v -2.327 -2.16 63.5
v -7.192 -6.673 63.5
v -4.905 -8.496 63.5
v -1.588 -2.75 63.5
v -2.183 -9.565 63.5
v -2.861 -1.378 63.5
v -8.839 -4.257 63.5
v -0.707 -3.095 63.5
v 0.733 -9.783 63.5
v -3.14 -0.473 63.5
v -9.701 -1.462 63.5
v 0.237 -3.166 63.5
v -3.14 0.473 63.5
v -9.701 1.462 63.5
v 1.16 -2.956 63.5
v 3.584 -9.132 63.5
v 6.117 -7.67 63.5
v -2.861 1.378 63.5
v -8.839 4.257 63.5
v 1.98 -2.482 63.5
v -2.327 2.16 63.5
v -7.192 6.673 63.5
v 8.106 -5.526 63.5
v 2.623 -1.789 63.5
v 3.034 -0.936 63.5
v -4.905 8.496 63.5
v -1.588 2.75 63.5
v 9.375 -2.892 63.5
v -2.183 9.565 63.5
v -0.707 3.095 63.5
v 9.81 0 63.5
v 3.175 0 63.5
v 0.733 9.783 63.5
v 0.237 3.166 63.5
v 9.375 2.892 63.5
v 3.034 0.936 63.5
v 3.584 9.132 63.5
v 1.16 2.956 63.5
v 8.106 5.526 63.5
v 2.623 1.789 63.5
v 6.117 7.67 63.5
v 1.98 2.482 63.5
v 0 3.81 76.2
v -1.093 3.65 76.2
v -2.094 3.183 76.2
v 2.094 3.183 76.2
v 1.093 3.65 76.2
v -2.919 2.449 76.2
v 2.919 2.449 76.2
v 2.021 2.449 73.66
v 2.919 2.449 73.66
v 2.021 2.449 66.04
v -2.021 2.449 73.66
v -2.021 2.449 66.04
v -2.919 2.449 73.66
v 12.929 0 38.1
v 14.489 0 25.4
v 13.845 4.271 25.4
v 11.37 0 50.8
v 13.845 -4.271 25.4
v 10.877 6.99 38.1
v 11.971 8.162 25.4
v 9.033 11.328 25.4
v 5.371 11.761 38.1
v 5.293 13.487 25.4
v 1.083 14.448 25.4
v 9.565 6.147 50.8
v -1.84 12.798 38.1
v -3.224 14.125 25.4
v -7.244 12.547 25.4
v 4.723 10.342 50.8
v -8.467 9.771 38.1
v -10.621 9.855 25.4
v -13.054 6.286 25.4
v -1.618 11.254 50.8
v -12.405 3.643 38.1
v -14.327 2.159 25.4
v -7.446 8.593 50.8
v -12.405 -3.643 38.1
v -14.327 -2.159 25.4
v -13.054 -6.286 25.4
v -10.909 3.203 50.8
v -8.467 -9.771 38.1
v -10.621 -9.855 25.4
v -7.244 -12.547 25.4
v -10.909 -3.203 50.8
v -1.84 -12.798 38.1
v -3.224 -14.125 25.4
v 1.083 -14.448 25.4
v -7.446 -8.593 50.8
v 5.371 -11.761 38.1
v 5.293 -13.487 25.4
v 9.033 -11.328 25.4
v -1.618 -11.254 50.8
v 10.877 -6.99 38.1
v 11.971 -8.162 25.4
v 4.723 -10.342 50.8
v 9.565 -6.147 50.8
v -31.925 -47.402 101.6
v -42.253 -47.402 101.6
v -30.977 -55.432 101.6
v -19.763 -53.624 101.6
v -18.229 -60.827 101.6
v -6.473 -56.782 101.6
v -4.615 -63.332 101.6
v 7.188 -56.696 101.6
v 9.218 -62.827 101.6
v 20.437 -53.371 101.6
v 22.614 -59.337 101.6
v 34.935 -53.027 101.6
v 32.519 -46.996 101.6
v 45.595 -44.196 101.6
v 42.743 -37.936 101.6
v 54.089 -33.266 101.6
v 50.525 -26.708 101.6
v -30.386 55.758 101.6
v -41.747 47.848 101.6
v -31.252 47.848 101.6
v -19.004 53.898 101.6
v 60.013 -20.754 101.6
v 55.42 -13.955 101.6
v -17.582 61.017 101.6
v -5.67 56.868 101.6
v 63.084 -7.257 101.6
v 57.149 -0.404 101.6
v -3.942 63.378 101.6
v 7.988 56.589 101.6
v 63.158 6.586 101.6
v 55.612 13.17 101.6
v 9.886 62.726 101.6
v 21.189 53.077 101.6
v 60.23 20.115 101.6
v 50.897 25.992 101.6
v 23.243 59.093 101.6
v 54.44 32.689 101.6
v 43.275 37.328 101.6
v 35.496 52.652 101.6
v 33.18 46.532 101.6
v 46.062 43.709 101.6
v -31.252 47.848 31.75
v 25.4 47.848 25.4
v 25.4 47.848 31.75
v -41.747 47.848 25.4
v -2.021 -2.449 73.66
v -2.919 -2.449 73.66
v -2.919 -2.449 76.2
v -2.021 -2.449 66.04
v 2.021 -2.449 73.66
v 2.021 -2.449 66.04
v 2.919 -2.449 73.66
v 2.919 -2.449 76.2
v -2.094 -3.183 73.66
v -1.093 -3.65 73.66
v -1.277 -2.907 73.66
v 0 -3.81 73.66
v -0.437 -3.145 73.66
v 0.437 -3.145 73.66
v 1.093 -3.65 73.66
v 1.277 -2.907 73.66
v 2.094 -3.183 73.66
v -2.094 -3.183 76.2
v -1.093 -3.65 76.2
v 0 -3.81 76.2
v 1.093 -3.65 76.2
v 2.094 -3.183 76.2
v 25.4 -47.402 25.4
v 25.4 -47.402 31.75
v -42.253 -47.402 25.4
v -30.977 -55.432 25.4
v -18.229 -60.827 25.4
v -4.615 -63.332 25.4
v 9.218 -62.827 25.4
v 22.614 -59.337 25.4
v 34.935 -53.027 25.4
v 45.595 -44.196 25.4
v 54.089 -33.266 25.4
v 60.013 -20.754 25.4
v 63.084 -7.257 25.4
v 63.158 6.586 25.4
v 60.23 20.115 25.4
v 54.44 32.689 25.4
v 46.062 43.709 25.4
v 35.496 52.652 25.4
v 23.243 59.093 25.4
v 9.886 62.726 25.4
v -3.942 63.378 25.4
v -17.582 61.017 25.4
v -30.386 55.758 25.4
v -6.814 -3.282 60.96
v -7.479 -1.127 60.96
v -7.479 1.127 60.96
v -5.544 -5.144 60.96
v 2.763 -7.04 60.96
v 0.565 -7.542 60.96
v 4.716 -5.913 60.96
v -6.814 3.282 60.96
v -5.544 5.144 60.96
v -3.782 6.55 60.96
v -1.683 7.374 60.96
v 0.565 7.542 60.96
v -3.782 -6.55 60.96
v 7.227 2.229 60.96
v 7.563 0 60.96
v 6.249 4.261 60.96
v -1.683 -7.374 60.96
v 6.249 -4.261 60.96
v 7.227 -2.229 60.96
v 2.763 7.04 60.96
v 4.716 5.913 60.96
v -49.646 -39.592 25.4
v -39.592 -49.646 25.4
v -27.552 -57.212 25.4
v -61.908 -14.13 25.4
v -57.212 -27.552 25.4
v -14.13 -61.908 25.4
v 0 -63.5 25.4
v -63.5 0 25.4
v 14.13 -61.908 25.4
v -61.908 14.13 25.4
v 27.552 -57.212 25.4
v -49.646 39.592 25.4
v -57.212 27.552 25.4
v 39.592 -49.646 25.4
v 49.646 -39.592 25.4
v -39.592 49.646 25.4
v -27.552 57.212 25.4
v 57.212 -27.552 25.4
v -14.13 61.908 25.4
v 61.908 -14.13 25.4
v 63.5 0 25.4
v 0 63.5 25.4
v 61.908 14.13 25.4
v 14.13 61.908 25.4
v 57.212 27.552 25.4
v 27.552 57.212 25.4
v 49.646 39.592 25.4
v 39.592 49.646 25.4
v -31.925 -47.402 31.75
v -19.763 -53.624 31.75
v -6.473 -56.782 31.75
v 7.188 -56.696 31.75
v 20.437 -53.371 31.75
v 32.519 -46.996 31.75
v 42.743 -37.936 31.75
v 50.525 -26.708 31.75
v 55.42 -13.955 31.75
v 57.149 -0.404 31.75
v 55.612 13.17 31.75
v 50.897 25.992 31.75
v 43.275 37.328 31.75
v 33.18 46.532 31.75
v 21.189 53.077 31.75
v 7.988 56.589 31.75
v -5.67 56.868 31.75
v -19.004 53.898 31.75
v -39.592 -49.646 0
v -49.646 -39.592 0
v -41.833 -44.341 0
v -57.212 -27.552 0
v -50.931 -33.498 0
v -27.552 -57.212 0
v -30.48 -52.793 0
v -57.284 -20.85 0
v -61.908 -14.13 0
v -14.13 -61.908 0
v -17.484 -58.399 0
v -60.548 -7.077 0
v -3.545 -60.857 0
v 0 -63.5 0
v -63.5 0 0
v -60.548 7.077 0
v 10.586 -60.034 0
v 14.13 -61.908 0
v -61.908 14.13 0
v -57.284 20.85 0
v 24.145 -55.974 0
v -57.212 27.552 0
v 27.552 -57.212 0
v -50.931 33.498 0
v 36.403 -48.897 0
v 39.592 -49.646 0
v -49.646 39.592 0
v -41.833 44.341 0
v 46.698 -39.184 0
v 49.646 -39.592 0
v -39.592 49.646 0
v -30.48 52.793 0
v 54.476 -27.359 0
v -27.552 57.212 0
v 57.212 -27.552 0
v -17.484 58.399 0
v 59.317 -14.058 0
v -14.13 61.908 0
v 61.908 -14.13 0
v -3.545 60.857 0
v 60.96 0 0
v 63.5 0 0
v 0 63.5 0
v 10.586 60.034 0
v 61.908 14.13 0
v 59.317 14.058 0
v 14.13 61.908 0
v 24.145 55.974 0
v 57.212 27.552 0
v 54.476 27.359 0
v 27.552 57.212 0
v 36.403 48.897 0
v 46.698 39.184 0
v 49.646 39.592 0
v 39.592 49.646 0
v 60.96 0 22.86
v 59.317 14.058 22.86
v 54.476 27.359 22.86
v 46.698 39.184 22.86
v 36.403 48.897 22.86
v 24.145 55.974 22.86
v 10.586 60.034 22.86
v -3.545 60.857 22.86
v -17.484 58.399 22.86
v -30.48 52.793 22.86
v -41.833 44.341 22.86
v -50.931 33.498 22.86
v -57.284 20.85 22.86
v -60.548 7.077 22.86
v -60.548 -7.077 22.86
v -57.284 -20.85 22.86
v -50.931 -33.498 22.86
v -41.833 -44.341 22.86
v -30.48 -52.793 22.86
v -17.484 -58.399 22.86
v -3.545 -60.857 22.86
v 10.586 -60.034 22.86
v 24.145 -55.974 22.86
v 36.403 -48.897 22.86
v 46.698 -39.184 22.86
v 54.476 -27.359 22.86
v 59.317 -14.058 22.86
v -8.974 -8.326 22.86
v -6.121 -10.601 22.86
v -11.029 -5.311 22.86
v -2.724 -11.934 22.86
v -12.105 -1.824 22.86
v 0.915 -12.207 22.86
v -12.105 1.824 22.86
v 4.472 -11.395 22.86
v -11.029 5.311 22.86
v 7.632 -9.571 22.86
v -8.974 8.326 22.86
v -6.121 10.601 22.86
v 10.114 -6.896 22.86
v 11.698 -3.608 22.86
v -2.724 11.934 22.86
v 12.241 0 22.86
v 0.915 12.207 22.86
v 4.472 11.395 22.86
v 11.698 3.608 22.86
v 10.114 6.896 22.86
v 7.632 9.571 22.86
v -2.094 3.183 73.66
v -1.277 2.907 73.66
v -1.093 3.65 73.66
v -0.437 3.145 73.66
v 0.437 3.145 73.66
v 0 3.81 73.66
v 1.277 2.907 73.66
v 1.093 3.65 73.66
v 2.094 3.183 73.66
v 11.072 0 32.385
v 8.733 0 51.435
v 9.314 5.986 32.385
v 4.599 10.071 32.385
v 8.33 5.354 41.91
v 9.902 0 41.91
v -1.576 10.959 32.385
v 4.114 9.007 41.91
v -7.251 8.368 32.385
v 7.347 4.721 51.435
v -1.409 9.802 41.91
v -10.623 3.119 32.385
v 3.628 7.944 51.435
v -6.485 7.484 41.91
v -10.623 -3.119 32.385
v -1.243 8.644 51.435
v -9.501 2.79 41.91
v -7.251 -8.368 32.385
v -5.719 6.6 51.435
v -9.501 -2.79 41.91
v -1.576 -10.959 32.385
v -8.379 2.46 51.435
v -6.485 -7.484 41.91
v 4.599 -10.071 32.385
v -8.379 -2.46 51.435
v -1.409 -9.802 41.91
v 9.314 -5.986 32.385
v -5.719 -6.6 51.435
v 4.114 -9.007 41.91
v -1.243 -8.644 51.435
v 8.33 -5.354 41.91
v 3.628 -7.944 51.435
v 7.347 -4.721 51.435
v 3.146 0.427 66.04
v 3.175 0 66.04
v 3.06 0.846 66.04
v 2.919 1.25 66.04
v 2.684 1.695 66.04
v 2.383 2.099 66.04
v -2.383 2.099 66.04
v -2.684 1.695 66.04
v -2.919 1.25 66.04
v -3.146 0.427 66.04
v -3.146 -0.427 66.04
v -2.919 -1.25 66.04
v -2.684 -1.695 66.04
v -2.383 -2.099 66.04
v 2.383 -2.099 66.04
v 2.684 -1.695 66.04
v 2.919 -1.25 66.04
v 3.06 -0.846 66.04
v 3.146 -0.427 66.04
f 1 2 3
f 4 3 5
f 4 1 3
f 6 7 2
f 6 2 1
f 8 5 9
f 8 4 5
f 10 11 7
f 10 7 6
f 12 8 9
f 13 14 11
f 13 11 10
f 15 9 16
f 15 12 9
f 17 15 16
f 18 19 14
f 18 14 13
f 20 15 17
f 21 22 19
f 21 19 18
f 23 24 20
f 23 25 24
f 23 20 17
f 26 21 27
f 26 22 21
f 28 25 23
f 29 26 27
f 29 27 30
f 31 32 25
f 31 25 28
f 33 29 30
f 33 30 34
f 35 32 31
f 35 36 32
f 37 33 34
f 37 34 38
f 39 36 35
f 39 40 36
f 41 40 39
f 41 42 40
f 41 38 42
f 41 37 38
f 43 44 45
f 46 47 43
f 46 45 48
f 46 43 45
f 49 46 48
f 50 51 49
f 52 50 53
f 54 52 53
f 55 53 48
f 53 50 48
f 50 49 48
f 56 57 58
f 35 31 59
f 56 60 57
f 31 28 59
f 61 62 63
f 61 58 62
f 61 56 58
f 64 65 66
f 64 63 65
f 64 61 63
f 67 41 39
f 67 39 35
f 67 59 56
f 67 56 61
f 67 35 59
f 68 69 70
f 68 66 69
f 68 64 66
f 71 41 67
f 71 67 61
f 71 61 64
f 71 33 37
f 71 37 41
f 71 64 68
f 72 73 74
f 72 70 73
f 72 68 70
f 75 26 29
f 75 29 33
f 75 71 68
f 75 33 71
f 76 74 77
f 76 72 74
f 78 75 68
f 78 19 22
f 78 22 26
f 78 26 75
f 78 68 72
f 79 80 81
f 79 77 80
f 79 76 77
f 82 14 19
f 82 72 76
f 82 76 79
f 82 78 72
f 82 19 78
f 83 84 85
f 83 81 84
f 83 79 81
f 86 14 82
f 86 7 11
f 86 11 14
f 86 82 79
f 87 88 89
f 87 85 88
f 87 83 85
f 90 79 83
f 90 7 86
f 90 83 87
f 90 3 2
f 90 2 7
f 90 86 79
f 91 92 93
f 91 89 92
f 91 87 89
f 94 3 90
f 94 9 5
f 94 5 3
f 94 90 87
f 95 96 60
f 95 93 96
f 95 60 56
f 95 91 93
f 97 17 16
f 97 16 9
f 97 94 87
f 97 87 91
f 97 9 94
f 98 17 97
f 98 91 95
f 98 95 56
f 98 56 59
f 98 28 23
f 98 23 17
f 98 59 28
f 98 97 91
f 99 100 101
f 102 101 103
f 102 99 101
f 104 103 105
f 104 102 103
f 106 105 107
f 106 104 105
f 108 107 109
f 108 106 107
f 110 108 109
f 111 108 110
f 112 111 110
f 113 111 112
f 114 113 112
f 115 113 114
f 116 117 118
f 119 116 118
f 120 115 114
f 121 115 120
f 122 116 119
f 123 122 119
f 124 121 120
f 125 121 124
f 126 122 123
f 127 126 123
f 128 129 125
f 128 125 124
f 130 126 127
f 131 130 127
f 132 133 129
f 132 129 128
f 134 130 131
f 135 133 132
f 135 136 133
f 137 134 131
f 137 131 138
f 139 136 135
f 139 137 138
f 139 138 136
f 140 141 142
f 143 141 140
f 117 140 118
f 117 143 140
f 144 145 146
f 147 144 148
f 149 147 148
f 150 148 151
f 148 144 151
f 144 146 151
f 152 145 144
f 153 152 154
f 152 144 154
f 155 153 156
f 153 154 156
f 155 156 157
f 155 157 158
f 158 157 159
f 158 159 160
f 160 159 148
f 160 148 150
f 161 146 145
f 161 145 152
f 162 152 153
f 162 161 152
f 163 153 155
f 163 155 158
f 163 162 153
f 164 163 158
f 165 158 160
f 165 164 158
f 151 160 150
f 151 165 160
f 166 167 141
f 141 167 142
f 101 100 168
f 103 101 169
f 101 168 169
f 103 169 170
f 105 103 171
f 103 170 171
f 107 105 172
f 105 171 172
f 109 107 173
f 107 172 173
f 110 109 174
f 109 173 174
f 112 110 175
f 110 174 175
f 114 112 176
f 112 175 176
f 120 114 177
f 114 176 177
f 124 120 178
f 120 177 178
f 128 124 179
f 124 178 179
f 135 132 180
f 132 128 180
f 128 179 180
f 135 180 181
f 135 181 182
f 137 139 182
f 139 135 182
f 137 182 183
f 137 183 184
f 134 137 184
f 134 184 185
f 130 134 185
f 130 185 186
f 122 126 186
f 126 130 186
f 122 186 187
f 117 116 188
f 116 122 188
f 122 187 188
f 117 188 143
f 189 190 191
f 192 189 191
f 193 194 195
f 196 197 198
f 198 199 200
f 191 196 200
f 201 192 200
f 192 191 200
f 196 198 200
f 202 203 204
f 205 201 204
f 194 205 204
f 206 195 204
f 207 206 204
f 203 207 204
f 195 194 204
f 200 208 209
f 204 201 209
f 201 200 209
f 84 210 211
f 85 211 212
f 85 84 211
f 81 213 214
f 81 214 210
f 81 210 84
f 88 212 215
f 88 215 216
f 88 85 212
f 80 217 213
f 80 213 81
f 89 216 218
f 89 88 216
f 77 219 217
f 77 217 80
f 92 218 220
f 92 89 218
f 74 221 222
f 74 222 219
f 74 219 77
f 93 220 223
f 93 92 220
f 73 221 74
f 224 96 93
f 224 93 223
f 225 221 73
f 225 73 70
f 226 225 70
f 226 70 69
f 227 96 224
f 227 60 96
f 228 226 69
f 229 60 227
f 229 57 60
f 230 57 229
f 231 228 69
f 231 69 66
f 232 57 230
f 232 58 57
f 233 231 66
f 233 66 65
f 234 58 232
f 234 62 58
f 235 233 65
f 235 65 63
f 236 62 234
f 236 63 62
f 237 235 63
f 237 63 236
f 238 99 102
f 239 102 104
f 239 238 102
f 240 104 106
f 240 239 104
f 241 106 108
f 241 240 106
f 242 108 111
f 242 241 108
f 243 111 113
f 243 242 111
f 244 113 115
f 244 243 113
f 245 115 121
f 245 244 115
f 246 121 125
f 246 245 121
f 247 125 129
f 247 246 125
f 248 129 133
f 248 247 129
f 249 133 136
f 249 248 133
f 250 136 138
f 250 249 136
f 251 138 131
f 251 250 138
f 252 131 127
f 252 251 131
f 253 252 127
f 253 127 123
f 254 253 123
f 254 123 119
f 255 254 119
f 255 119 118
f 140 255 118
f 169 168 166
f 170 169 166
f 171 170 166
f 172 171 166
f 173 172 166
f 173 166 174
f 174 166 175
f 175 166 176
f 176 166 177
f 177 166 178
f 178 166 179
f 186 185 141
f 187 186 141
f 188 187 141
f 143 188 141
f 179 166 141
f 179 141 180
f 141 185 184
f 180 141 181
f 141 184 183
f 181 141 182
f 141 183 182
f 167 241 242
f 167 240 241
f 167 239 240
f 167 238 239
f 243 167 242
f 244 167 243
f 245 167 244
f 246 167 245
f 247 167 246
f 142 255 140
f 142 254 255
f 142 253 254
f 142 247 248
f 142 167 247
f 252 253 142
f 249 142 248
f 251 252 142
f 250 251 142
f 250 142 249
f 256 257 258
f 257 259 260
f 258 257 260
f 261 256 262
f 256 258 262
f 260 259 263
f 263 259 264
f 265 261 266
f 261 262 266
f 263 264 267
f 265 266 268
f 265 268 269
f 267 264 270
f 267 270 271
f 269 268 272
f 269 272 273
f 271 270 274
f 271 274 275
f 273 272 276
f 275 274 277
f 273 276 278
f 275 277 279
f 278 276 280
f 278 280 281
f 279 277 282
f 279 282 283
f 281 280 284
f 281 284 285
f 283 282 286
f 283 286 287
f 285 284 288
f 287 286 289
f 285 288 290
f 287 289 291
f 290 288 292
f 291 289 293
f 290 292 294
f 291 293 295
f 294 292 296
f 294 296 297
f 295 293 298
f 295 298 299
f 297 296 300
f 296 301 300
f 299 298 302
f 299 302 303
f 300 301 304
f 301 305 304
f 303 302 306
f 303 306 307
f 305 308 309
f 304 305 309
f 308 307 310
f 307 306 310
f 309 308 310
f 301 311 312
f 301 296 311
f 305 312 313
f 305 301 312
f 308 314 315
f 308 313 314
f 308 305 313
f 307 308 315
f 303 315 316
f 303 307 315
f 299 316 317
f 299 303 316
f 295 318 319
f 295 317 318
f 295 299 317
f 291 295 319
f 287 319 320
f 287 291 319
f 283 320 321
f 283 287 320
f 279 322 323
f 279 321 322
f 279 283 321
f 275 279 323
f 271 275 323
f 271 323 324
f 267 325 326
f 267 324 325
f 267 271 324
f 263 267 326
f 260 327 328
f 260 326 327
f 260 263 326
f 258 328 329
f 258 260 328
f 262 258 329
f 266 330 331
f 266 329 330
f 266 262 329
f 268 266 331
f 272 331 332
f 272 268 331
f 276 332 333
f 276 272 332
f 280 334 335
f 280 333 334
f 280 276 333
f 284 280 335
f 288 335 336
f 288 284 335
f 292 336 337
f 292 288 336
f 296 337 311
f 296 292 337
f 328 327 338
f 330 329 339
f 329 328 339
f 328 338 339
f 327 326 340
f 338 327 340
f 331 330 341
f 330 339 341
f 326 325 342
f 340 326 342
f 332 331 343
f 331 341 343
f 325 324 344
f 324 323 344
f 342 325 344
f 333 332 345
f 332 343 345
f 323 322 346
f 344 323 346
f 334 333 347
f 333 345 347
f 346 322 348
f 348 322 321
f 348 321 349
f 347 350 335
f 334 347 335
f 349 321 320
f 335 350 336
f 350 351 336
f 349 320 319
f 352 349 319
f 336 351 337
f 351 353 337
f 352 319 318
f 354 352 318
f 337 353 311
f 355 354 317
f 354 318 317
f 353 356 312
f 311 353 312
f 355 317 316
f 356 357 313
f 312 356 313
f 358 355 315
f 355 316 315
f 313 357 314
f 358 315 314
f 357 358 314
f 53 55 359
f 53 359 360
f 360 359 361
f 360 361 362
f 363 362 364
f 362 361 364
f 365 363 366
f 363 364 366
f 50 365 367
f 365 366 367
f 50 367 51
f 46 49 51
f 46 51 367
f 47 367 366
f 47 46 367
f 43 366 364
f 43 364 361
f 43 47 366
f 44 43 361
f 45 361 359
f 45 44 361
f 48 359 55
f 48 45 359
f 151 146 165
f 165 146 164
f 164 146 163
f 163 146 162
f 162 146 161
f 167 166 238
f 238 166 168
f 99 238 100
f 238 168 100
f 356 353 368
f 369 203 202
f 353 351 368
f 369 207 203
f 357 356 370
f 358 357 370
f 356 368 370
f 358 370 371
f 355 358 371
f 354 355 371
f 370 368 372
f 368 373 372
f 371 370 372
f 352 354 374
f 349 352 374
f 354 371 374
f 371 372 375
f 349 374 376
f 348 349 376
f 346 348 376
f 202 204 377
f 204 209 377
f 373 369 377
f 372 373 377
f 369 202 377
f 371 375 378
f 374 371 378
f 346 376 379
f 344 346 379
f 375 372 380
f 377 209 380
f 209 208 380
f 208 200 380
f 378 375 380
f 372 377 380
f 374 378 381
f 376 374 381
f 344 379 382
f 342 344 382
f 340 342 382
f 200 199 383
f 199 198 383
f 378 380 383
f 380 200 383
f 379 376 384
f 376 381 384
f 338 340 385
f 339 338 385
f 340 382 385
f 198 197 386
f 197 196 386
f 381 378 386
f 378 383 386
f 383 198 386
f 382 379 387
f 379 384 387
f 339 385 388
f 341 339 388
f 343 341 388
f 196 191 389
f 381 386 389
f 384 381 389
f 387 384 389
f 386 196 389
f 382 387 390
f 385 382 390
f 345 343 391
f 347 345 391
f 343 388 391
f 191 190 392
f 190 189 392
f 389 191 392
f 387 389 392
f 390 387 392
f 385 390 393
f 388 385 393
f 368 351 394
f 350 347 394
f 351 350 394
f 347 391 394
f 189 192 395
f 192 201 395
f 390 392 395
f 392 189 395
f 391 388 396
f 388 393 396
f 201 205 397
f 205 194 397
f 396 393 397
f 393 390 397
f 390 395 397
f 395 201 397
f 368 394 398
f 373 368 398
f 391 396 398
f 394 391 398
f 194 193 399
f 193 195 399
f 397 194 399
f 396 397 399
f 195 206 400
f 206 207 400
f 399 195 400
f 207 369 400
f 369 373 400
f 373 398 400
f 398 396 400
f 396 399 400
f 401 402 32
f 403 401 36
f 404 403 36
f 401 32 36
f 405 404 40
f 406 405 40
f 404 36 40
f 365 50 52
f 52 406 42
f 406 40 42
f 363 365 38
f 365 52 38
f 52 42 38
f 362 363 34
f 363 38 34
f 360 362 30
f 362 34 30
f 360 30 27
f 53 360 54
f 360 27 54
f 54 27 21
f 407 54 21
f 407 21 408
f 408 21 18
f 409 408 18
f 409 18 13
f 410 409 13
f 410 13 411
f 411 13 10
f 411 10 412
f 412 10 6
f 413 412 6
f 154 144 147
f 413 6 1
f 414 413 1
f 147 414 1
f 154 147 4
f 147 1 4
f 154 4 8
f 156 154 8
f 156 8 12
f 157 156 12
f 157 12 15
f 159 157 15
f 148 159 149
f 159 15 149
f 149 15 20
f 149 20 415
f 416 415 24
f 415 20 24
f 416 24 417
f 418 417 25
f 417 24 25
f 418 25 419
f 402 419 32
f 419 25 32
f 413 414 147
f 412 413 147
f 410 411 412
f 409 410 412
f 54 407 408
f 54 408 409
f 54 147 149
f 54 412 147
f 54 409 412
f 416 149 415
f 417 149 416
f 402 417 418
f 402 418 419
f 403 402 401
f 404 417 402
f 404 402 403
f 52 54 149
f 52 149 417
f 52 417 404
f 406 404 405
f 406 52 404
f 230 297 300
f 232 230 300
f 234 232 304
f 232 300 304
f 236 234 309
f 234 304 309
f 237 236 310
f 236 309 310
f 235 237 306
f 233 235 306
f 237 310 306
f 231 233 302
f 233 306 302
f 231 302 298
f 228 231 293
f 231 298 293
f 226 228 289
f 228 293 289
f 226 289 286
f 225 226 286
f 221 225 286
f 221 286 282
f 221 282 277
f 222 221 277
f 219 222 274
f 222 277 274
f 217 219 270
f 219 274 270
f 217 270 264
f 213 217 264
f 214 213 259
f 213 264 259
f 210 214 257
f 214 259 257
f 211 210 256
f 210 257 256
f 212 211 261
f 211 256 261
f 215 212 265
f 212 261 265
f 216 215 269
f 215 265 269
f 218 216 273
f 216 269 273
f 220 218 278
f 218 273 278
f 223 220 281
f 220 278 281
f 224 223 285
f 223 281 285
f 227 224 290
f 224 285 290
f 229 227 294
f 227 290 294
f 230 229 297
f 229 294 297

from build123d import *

# Parameters (mm, degrees)
F0_R      = 63.5
F1_DEPTH  = 25.4
F3_R      = 63.5
F4_DEPTH  = 76.2
F7_T      = -6.35
F10_W     = 95.25
F10_H     = 76.2
F11_DEPTH = 88.9
F12_R     = 14.488575167
F13_DEPTH = 38.1
F13_TAPER = 7
F14_T     = -2.54
F15_R     = 3.175
F16_DEPTH = 12.7
F18_DEPTH = 2.54
F19_DEPTH = 10.16
F20_DEPTH = 10.16


with BuildPart() as f1:
    # F0 (on Top) → F1 (new body)
    with BuildSketch(Plane.XY):
        Circle(F0_R)
    extrude(amount=F1_DEPTH)

    # F12 (on offset) → F13 (join)
    with BuildSketch(Plane.XY.offset(25.4)):
        Circle(F12_R)
    extrude(amount=F13_DEPTH, taper=F13_TAPER)

    # F14
    f14_openings = [f1.faces().sort_by_distance(p)[0] for p in [
        (0, 0, 0),
    ]]
    offset(amount=F14_T, openings=f14_openings, kind=Kind.INTERSECTION)

    # F15 (on face) → F16 (join)
    with BuildSketch(Plane.XY.offset(63.5)):
        Circle(F15_R)
    extrude(amount=F16_DEPTH)

    # F17 (on face) → F18 (join)
    with BuildSketch(Plane.XY.offset(76.2)):
        with BuildLine():
            ThreePointArc((2.9187135572, -2.4489204092), (3.5802512938, -1.3030351774), (3.81, 0))
            ThreePointArc((3.81, 0), (3.5802512938, 1.3030351774), (2.9187135572, 2.4489204092))
            Line((2.9187135572, 2.4489204092), (2.9187135572, 1.249694431))
            ThreePointArc((2.9187135572, 1.249694431), (3.1102685209, 0.6378516504), (3.175, 0))
            ThreePointArc((3.175, 0), (3.1102685209, -0.6378516504), (2.9187135572, -1.249694431))
            Line((2.9187135572, -1.249694431), (2.9187135572, -2.4489204092))
        make_face()
        with BuildLine():
            Line((2.0207458596, 2.4489204092), (2.9187135572, 2.4489204092))
            ThreePointArc((2.9187135572, 2.4489204092), (0, 3.81), (-2.9187135572, 2.4489204092))
            Line((-2.9187135572, 2.4489204092), (-2.0207458596, 2.4489204092))
            ThreePointArc((-2.0207458596, 2.4489204092), (0, 3.175), (2.0207458596, 2.4489204092))
        make_face()
        with BuildLine():
            Line((2.9187135572, 1.249694431), (2.9187135572, 2.4489204092))
            Line((2.9187135572, 2.4489204092), (2.0207458596, 2.4489204092))
            ThreePointArc((2.0207458596, 2.4489204092), (2.5414760612, 1.9030303283), (2.9187135572, 1.249694431))
        make_face()
        with BuildLine():
            ThreePointArc((-2.9187135572, -2.4489204092), (0, -3.81), (2.9187135572, -2.4489204092))
            Line((2.9187135572, -2.4489204092), (2.0207458596, -2.4489204092))
            ThreePointArc((2.0207458596, -2.4489204092), (0, -3.175), (-2.0207458596, -2.4489204092))
            Line((-2.0207458596, -2.4489204092), (-2.9187135572, -2.4489204092))
        make_face()
        with BuildLine():
            Line((2.0207458596, -2.4489204092), (2.9187135572, -2.4489204092))
            Line((2.9187135572, -2.4489204092), (2.9187135572, -1.249694431))
            ThreePointArc((2.9187135572, -1.249694431), (2.5414760612, -1.9030303283), (2.0207458596, -2.4489204092))
        make_face()
        with BuildLine():
            Line((-2.9187135572, 1.249694431), (-2.9187135572, 2.4489204092))
            ThreePointArc((-2.9187135572, 2.4489204092), (-3.81, 0), (-2.9187135572, -2.4489204092))
            Line((-2.9187135572, -2.4489204092), (-2.9187135572, -1.249694431))
            ThreePointArc((-2.9187135572, -1.249694431), (-3.175, 0), (-2.9187135572, 1.249694431))
        make_face()
        with BuildLine():
            Line((-2.0207458596, 2.4489204092), (-2.9187135572, 2.4489204092))
            Line((-2.9187135572, 2.4489204092), (-2.9187135572, 1.249694431))
            ThreePointArc((-2.9187135572, 1.249694431), (-2.5414760612, 1.9030303283), (-2.0207458596, 2.4489204092))
        make_face()
        with BuildLine():
            Line((-2.9187135572, -1.249694431), (-2.9187135572, -2.4489204092))
            Line((-2.9187135572, -2.4489204092), (-2.0207458596, -2.4489204092))
            ThreePointArc((-2.0207458596, -2.4489204092), (-2.5414760612, -1.9030303283), (-2.9187135572, -1.249694431))
        make_face()
    extrude(amount=-F18_DEPTH)

    # F17 (on face) → F19 (cut)
    with BuildSketch(Plane.XY.offset(76.2)):
        with BuildLine():
            ThreePointArc((2.9187135572, 1.249694431), (2.5414760612, 1.9030303283), (2.0207458596, 2.4489204092))
            Line((2.0207458596, 2.4489204092), (-2.0207458596, 2.4489204092))
            ThreePointArc((-2.0207458596, 2.4489204092), (-2.5414760612, 1.9030303283), (-2.9187135572, 1.249694431))
            Line((-2.9187135572, 1.249694431), (-2.9187135572, -1.249694431))
            ThreePointArc((-2.9187135572, -1.249694431), (-2.5414760612, -1.9030303283), (-2.0207458596, -2.4489204092))
            Line((-2.0207458596, -2.4489204092), (2.0207458596, -2.4489204092))
            ThreePointArc((2.0207458596, -2.4489204092), (2.5414760612, -1.9030303283), (2.9187135572, -1.249694431))
            Line((2.9187135572, -1.249694431), (2.9187135572, 1.249694431))
        make_face()
        with BuildLine():
            ThreePointArc((3.175, 0), (3.1102685209, 0.6378516504), (2.9187135572, 1.249694431))
            Line((2.9187135572, 1.249694431), (2.9187135572, -1.249694431))
            ThreePointArc((2.9187135572, -1.249694431), (3.1102685209, -0.6378516504), (3.175, 0))
        make_face()
        with BuildLine():
            Line((-2.9187135572, -1.249694431), (-2.9187135572, 1.249694431))
            ThreePointArc((-2.9187135572, 1.249694431), (-3.175, 0), (-2.9187135572, -1.249694431))
        make_face()
    extrude(amount=-F19_DEPTH, mode=Mode.SUBTRACT)

    # F17 (on face) → F20 (cut)
    with BuildSketch(Plane.XY.offset(76.2)):
        with BuildLine():
            Line((-2.9187135572, -1.249694431), (-2.9187135572, -2.4489204092))
            Line((-2.9187135572, -2.4489204092), (-2.0207458596, -2.4489204092))
            ThreePointArc((-2.0207458596, -2.4489204092), (-2.5414760612, -1.9030303283), (-2.9187135572, -1.249694431))
        make_face()
        with BuildLine():
            Line((-2.0207458596, 2.4489204092), (-2.9187135572, 2.4489204092))
            Line((-2.9187135572, 2.4489204092), (-2.9187135572, 1.249694431))
            ThreePointArc((-2.9187135572, 1.249694431), (-2.5414760612, 1.9030303283), (-2.0207458596, 2.4489204092))
        make_face()
        with BuildLine():
            Line((2.0207458596, -2.4489204092), (2.9187135572, -2.4489204092))
            Line((2.9187135572, -2.4489204092), (2.9187135572, -1.249694431))
            ThreePointArc((2.9187135572, -1.249694431), (2.5414760612, -1.9030303283), (2.0207458596, -2.4489204092))
        make_face()
        with BuildLine():
            Line((2.9187135572, 1.249694431), (2.9187135572, 2.4489204092))
            Line((2.9187135572, 2.4489204092), (2.0207458596, 2.4489204092))
            ThreePointArc((2.0207458596, 2.4489204092), (2.5414760612, 1.9030303283), (2.9187135572, 1.249694431))
        make_face()
        with BuildLine():
            Line((-2.9187135572, 1.249694431), (-2.9187135572, 2.4489204092))
            ThreePointArc((-2.9187135572, 2.4489204092), (-3.81, 0), (-2.9187135572, -2.4489204092))
            Line((-2.9187135572, -2.4489204092), (-2.9187135572, -1.249694431))
            ThreePointArc((-2.9187135572, -1.249694431), (-3.175, 0), (-2.9187135572, 1.249694431))
        make_face()
        with BuildLine():
            ThreePointArc((2.9187135572, -2.4489204092), (3.5802512938, -1.3030351774), (3.81, 0))
            ThreePointArc((3.81, 0), (3.5802512938, 1.3030351774), (2.9187135572, 2.4489204092))
            Line((2.9187135572, 2.4489204092), (2.9187135572, 1.249694431))
            ThreePointArc((2.9187135572, 1.249694431), (3.1102685209, 0.6378516504), (3.175, 0))
            ThreePointArc((3.175, 0), (3.1102685209, -0.6378516504), (2.9187135572, -1.249694431))
            Line((2.9187135572, -1.249694431), (2.9187135572, -2.4489204092))
        make_face()
    extrude(amount=-F20_DEPTH, mode=Mode.SUBTRACT)


with BuildPart() as f4:
    # F3 (on offset) → F4 (new body)
    with BuildSketch(Plane.XY.offset(25.4)):
        Circle(F3_R)
    extrude(amount=F4_DEPTH)

    # F7
    f7_openings = [f4.faces().sort_by_distance(p)[0] for p in [
        (0, 0, 101.6),
    ]]
    offset(amount=F7_T, openings=f7_openings)

    # F10 (on offset) → F11 (cut)
    with BuildSketch(Plane.YZ.offset(-63.5)):
        with Locations((0.2231750339, 63.5)):
            Rectangle(F10_W, F10_H)
    extrude(amount=F11_DEPTH, mode=Mode.SUBTRACT)


solid = Compound([f1.part, f4.part])
